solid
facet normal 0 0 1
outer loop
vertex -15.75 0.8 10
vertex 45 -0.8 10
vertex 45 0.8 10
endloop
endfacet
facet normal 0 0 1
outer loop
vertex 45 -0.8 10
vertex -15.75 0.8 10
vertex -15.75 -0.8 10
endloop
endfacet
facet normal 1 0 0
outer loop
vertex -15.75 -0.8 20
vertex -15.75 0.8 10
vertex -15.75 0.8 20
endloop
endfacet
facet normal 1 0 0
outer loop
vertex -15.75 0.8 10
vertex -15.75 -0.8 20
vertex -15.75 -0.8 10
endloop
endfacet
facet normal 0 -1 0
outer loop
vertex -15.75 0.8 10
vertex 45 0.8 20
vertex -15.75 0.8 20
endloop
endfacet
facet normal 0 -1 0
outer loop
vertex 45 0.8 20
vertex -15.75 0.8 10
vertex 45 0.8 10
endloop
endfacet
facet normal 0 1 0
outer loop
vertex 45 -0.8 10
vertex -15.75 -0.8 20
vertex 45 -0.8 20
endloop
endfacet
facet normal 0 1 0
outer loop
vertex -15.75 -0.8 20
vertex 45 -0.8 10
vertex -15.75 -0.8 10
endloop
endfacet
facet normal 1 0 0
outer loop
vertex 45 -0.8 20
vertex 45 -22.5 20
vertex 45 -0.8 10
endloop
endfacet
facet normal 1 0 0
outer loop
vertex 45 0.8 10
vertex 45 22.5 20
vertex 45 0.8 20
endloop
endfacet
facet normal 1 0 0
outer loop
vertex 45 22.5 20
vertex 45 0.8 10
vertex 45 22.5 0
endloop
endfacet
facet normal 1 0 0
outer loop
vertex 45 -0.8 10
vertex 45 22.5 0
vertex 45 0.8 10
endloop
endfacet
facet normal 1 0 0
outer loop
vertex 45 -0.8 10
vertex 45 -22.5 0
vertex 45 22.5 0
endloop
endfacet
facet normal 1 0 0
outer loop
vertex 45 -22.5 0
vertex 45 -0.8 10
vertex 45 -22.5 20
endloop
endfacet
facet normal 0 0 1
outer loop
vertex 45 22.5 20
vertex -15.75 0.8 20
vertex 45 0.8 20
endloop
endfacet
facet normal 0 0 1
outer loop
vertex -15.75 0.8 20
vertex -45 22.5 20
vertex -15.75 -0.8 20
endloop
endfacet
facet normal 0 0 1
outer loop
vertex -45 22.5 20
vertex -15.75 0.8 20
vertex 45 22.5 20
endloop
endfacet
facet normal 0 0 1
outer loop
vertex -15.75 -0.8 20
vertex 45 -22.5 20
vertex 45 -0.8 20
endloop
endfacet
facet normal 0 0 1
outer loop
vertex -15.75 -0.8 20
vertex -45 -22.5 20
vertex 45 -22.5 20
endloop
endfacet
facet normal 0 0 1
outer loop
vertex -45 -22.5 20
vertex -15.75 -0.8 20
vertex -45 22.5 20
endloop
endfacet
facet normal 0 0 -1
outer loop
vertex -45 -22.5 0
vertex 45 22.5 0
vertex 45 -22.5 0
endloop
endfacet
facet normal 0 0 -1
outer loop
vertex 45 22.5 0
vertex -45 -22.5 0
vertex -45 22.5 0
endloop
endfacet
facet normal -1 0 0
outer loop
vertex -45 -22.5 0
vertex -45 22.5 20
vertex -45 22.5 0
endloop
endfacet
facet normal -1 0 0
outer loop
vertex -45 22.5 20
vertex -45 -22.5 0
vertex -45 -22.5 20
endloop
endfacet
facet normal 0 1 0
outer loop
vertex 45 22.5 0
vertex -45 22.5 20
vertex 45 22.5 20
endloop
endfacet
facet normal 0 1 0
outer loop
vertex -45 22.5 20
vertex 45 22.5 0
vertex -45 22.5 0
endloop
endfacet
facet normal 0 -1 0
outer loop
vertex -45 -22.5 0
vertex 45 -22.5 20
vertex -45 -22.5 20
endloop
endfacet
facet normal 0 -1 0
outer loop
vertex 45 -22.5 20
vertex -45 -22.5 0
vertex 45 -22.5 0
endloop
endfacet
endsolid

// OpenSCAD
// Microscope slide drying rack
// Print orientation: base on the bed (z = 0), slots open upward (+Z)

// ---------------- Parameters ----------------
block_len     = 90;    // base block length along X (mm)
block_wid     = 45;    // base block width along Y (mm)
block_h       = 20;    // base block height along Z (mm)

slot_count    = 10;    // number of slide slots
slot_len      = 77;    // slot length along X (mm)
slot_w        = 1.6;   // slot width along Y (mm)
slot_depth    = 10;    // slot depth from top face (mm)
slot_pitch    = 3.5;   // centre-to-centre slot spacing along Y (mm)

eps           = 0.5;   // overshoot of cutters past faces (mm)

$fn = 64;

// ---------------- Model ----------------
difference() {
    // Base block, centred in X and Y, resting on z = 0
    translate([-block_len/2, -block_wid/2, 0])
        cube([block_len, block_wid, block_h]);

    // Parallel slots running along X, centred as a group in X and Y
    for (i = [0 : slot_count - 1]) {
        translate([(i - (slot_count - 1)/2) * slot_pitch, -slot_w/2,
                   block_h - slot_depth])
            cube([slot_len, slot_w, slot_depth + eps]);
    }
}
